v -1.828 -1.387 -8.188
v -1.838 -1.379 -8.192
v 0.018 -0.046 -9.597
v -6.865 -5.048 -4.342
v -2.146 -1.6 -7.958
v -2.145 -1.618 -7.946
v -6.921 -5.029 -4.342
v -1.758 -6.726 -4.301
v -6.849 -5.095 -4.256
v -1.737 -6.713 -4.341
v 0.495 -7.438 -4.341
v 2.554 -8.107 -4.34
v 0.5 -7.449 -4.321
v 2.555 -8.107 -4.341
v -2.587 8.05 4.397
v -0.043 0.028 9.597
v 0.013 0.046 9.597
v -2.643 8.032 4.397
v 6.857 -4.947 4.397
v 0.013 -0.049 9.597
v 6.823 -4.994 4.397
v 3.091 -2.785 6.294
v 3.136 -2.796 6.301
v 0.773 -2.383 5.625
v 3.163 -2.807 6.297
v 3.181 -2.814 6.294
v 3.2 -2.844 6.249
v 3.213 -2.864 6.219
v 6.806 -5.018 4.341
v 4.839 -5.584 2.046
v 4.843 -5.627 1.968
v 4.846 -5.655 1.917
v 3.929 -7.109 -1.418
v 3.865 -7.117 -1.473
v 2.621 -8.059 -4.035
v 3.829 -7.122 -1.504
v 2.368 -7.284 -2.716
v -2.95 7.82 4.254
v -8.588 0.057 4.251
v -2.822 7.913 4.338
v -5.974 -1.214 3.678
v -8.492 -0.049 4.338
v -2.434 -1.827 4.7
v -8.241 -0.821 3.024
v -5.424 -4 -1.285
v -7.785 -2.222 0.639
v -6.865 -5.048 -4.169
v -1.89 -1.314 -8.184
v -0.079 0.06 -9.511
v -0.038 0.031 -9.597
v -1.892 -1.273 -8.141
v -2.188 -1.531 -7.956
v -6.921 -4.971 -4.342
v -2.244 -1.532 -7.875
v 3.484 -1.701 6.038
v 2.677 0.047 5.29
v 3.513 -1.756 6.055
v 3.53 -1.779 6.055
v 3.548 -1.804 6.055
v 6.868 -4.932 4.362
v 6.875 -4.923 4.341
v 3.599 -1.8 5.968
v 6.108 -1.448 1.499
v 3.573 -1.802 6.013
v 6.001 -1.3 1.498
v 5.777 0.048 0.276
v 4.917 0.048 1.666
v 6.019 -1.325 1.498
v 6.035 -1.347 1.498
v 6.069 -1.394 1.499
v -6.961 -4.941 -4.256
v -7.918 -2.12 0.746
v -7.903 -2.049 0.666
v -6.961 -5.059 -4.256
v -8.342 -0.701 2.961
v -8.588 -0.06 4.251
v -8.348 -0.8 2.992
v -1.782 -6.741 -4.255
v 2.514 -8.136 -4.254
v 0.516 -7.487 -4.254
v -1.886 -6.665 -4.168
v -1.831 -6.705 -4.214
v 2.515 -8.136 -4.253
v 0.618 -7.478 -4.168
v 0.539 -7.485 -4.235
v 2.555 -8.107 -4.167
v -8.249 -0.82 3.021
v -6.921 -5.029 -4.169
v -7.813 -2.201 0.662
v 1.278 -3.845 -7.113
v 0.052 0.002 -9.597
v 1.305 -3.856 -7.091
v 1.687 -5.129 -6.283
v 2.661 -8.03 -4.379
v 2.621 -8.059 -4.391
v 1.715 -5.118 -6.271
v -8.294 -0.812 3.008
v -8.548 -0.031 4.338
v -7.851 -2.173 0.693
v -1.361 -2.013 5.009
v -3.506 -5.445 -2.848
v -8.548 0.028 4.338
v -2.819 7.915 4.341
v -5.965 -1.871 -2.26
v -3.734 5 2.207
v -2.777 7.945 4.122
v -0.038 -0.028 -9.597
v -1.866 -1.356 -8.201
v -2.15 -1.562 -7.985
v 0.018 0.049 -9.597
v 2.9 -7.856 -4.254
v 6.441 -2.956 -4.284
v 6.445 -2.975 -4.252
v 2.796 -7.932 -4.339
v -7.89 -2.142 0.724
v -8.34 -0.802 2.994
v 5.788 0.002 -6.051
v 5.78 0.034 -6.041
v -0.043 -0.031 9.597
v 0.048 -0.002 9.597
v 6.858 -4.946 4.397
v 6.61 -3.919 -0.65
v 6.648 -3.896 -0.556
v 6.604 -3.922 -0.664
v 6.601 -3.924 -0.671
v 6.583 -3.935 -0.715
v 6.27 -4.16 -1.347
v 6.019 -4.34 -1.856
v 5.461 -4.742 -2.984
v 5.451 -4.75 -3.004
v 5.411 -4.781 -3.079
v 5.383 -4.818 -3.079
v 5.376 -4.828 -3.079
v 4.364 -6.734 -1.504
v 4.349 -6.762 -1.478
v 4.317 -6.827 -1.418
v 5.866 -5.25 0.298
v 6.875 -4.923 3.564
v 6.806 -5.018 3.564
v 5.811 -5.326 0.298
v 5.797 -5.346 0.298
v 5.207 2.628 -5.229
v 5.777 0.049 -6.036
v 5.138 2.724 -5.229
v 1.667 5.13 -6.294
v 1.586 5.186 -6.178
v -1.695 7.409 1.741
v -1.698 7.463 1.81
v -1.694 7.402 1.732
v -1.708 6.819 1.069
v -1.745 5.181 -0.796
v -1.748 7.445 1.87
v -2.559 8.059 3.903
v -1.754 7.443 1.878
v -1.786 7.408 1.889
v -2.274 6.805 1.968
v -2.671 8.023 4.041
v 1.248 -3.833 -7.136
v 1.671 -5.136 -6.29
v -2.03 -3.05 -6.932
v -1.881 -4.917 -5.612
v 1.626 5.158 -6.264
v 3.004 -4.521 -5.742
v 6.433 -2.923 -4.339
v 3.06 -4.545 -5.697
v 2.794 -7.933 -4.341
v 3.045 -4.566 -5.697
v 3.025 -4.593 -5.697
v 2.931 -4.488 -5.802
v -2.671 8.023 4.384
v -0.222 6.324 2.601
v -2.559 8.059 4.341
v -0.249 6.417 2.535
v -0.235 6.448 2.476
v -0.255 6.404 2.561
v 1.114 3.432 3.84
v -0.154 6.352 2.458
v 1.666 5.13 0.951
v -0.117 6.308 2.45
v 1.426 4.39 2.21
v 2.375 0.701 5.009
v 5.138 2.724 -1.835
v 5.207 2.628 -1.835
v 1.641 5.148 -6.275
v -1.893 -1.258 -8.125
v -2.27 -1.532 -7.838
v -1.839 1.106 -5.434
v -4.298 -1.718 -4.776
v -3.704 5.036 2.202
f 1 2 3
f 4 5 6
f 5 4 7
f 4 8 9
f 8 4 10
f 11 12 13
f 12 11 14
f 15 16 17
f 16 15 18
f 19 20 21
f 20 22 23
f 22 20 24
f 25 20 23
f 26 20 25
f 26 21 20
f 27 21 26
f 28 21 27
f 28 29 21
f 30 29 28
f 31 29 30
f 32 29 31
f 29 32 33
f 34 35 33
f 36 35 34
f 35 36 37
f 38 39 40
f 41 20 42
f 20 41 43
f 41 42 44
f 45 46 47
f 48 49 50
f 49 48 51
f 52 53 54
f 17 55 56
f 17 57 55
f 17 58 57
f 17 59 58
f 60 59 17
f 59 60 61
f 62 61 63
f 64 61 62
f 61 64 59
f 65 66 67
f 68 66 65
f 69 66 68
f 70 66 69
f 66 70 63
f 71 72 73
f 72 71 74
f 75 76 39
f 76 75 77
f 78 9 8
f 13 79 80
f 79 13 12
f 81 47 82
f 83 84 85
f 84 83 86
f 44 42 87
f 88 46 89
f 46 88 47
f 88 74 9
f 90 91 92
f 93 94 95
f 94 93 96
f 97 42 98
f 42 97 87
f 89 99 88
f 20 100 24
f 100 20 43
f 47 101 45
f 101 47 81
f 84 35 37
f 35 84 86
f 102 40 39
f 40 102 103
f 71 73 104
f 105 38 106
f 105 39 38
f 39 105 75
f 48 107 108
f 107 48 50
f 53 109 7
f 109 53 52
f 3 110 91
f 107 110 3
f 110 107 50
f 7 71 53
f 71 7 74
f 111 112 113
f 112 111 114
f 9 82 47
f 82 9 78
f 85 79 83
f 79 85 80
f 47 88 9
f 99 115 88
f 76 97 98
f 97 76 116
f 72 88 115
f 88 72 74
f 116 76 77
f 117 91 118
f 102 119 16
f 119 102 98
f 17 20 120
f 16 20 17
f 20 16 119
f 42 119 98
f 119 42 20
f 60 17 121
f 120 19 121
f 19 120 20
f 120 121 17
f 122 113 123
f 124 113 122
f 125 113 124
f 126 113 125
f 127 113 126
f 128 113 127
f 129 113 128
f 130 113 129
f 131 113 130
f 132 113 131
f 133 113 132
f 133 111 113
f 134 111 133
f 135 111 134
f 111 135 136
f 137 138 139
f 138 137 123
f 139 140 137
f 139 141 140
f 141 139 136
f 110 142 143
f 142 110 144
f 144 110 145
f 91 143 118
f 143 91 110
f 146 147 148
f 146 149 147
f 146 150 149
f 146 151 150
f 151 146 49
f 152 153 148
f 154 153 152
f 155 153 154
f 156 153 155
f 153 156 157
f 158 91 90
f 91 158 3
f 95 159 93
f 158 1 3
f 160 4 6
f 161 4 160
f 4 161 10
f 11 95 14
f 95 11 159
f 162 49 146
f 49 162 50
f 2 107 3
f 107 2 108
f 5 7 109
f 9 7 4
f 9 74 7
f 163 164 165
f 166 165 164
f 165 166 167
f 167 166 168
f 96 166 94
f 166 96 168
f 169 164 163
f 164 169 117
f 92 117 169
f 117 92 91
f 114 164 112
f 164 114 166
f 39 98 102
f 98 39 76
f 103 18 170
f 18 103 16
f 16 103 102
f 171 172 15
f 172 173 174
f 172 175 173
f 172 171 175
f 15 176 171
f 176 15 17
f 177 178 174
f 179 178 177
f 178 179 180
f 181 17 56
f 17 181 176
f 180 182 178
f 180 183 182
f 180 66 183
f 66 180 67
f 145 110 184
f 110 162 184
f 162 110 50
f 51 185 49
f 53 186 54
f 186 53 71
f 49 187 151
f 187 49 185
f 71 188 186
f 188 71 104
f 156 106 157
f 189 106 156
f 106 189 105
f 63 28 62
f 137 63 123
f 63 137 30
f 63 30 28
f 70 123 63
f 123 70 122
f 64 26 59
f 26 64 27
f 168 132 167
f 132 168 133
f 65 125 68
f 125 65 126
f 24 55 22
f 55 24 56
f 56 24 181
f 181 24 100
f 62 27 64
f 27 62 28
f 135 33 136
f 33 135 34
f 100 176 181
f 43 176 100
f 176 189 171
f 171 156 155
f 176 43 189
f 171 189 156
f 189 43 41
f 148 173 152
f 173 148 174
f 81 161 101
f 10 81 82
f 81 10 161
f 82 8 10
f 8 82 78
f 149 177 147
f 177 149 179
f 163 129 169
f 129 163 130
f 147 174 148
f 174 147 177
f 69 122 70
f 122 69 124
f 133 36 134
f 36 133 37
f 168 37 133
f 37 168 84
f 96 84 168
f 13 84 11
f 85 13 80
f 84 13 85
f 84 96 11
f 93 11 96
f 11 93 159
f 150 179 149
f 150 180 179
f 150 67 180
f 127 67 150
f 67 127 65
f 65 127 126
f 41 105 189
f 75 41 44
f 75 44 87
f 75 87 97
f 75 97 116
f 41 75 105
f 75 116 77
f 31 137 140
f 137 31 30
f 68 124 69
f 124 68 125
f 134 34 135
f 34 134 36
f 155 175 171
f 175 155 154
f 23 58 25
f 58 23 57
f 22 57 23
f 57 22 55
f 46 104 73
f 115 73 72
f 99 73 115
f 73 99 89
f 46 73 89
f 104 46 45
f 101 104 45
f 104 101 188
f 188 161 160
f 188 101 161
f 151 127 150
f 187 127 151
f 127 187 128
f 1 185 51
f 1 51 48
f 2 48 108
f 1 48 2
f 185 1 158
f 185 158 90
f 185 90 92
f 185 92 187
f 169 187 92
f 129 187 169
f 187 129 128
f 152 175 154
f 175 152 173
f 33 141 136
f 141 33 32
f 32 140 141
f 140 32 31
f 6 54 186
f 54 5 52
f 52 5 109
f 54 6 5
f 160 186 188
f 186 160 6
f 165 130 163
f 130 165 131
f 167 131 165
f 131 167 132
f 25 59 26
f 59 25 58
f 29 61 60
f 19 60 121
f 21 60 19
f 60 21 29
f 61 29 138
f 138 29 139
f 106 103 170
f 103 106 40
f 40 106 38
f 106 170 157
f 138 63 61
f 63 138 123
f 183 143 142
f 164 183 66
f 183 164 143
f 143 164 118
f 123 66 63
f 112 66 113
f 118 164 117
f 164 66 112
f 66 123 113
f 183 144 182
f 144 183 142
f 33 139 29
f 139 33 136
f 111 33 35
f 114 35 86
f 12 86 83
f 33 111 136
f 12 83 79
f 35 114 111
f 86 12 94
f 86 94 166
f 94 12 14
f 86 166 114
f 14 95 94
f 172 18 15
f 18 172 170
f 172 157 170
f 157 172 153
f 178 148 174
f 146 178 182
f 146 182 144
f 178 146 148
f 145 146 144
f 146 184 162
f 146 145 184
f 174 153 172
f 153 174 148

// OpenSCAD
// Auto-generated OpenSCAD file

    inner_points = 10*[[-0.5679521834680924, 0.3710392408495472, -0.708875678733561], [0.6774959295154908, -0.4922625333758151, -0.14177512924090818], [-1.0679348487285032, 0.2085260495957944, 0.14177512924090818], [0.17751326425508, -0.6547757246295679, 0.708875678733561], [0.010822126776322105, -0.4253965348253418, -0.8841193748434077], [-0.7981668194007837, -0.6883484018941259, 0.4922625450168436], [-0.2589805762752483, 0.796397621522542, 0.14177512737898157], [0.5107486887730253, 0.2628477825031803, 0.49226254200418296], [-0.13145834293776412, -1.0801341053025628, -0.14177512737898157]];

    outer_points = 10*[[-0.8507501659543638, -0.00016416400980563553, 0.42512659922224816], [0.0002222331138788114, 0.00016416400980563553, -0.9510564761622176], [-0.0002222331138788114, -0.00016416400980563553, 0.9510564761622176], [0.8507501659543638, 0.00016416400980563553, -0.42512659922224816], [-0.6880381915718803, -0.49999998970608384, -0.42557250195458624], [0.6881449121452123, -0.49999998970608384, 0.4253999146333339], [-0.26305127181358173, 0.8089155187812519, 0.4254035837408861], [0.2628785942986316, 0.8091184366568306, -0.4251243315890725], [0.26305127181358173, -0.8089155187812519, -0.4254035837408861]];

    // Convex hull for inner set (I)
    module inner_hull() {
        hull() {
            for (p = inner_points) {
                translate(p) sphere(r=0.1);
            }
        }
    }

    // Convex hull for outer set (O) minus inner hull (O \ I)
    module outer_minus_inner() {
        difference() {
            hull() {
                for (p = outer_points) {
                    translate(p) sphere(r=0.1);
                }
            }
            inner_hull(); // Subtract inner hull
        }
    }

    // Convex hull for outer set (O) minus all translated inner hulls
    module outer_minus_AllTranslationInner() {
        difference() {
            hull() {
                for (p = outer_points) {
                    translate(p) sphere(r=0.1);
                }
            }
            hull() {
                translate([0,0,50]) inner_hull();
                translate([0,0,-50]) inner_hull();
            }; // Subtract translated inner hulls
        }
    }

    // Difference between outer_minus_inner and outer_minus_AllTranslationInner
    module outer_minus_inner_diff() {
        difference() {
            // Outer minus inner
            difference() {
                hull() {
                    for (p = outer_points) {
                        translate(p) sphere(r=0.1);
                    }
                }
                inner_hull();
            }

            // Subtract Outer minus AllTranslationInner
            difference() {
                hull() {
                    for (p = outer_points) {
                        translate(p) sphere(r=0.1);
                    }
                }
                hull() {
                    translate([0,0,50]) inner_hull();
                    translate([0,0,-50]) inner_hull();
                };
            }
        }
    }

    // Rendering all with colors applied
    color([1, 1, 0, 1]) outer_minus_inner_diff(); // Opaque yellow
    
